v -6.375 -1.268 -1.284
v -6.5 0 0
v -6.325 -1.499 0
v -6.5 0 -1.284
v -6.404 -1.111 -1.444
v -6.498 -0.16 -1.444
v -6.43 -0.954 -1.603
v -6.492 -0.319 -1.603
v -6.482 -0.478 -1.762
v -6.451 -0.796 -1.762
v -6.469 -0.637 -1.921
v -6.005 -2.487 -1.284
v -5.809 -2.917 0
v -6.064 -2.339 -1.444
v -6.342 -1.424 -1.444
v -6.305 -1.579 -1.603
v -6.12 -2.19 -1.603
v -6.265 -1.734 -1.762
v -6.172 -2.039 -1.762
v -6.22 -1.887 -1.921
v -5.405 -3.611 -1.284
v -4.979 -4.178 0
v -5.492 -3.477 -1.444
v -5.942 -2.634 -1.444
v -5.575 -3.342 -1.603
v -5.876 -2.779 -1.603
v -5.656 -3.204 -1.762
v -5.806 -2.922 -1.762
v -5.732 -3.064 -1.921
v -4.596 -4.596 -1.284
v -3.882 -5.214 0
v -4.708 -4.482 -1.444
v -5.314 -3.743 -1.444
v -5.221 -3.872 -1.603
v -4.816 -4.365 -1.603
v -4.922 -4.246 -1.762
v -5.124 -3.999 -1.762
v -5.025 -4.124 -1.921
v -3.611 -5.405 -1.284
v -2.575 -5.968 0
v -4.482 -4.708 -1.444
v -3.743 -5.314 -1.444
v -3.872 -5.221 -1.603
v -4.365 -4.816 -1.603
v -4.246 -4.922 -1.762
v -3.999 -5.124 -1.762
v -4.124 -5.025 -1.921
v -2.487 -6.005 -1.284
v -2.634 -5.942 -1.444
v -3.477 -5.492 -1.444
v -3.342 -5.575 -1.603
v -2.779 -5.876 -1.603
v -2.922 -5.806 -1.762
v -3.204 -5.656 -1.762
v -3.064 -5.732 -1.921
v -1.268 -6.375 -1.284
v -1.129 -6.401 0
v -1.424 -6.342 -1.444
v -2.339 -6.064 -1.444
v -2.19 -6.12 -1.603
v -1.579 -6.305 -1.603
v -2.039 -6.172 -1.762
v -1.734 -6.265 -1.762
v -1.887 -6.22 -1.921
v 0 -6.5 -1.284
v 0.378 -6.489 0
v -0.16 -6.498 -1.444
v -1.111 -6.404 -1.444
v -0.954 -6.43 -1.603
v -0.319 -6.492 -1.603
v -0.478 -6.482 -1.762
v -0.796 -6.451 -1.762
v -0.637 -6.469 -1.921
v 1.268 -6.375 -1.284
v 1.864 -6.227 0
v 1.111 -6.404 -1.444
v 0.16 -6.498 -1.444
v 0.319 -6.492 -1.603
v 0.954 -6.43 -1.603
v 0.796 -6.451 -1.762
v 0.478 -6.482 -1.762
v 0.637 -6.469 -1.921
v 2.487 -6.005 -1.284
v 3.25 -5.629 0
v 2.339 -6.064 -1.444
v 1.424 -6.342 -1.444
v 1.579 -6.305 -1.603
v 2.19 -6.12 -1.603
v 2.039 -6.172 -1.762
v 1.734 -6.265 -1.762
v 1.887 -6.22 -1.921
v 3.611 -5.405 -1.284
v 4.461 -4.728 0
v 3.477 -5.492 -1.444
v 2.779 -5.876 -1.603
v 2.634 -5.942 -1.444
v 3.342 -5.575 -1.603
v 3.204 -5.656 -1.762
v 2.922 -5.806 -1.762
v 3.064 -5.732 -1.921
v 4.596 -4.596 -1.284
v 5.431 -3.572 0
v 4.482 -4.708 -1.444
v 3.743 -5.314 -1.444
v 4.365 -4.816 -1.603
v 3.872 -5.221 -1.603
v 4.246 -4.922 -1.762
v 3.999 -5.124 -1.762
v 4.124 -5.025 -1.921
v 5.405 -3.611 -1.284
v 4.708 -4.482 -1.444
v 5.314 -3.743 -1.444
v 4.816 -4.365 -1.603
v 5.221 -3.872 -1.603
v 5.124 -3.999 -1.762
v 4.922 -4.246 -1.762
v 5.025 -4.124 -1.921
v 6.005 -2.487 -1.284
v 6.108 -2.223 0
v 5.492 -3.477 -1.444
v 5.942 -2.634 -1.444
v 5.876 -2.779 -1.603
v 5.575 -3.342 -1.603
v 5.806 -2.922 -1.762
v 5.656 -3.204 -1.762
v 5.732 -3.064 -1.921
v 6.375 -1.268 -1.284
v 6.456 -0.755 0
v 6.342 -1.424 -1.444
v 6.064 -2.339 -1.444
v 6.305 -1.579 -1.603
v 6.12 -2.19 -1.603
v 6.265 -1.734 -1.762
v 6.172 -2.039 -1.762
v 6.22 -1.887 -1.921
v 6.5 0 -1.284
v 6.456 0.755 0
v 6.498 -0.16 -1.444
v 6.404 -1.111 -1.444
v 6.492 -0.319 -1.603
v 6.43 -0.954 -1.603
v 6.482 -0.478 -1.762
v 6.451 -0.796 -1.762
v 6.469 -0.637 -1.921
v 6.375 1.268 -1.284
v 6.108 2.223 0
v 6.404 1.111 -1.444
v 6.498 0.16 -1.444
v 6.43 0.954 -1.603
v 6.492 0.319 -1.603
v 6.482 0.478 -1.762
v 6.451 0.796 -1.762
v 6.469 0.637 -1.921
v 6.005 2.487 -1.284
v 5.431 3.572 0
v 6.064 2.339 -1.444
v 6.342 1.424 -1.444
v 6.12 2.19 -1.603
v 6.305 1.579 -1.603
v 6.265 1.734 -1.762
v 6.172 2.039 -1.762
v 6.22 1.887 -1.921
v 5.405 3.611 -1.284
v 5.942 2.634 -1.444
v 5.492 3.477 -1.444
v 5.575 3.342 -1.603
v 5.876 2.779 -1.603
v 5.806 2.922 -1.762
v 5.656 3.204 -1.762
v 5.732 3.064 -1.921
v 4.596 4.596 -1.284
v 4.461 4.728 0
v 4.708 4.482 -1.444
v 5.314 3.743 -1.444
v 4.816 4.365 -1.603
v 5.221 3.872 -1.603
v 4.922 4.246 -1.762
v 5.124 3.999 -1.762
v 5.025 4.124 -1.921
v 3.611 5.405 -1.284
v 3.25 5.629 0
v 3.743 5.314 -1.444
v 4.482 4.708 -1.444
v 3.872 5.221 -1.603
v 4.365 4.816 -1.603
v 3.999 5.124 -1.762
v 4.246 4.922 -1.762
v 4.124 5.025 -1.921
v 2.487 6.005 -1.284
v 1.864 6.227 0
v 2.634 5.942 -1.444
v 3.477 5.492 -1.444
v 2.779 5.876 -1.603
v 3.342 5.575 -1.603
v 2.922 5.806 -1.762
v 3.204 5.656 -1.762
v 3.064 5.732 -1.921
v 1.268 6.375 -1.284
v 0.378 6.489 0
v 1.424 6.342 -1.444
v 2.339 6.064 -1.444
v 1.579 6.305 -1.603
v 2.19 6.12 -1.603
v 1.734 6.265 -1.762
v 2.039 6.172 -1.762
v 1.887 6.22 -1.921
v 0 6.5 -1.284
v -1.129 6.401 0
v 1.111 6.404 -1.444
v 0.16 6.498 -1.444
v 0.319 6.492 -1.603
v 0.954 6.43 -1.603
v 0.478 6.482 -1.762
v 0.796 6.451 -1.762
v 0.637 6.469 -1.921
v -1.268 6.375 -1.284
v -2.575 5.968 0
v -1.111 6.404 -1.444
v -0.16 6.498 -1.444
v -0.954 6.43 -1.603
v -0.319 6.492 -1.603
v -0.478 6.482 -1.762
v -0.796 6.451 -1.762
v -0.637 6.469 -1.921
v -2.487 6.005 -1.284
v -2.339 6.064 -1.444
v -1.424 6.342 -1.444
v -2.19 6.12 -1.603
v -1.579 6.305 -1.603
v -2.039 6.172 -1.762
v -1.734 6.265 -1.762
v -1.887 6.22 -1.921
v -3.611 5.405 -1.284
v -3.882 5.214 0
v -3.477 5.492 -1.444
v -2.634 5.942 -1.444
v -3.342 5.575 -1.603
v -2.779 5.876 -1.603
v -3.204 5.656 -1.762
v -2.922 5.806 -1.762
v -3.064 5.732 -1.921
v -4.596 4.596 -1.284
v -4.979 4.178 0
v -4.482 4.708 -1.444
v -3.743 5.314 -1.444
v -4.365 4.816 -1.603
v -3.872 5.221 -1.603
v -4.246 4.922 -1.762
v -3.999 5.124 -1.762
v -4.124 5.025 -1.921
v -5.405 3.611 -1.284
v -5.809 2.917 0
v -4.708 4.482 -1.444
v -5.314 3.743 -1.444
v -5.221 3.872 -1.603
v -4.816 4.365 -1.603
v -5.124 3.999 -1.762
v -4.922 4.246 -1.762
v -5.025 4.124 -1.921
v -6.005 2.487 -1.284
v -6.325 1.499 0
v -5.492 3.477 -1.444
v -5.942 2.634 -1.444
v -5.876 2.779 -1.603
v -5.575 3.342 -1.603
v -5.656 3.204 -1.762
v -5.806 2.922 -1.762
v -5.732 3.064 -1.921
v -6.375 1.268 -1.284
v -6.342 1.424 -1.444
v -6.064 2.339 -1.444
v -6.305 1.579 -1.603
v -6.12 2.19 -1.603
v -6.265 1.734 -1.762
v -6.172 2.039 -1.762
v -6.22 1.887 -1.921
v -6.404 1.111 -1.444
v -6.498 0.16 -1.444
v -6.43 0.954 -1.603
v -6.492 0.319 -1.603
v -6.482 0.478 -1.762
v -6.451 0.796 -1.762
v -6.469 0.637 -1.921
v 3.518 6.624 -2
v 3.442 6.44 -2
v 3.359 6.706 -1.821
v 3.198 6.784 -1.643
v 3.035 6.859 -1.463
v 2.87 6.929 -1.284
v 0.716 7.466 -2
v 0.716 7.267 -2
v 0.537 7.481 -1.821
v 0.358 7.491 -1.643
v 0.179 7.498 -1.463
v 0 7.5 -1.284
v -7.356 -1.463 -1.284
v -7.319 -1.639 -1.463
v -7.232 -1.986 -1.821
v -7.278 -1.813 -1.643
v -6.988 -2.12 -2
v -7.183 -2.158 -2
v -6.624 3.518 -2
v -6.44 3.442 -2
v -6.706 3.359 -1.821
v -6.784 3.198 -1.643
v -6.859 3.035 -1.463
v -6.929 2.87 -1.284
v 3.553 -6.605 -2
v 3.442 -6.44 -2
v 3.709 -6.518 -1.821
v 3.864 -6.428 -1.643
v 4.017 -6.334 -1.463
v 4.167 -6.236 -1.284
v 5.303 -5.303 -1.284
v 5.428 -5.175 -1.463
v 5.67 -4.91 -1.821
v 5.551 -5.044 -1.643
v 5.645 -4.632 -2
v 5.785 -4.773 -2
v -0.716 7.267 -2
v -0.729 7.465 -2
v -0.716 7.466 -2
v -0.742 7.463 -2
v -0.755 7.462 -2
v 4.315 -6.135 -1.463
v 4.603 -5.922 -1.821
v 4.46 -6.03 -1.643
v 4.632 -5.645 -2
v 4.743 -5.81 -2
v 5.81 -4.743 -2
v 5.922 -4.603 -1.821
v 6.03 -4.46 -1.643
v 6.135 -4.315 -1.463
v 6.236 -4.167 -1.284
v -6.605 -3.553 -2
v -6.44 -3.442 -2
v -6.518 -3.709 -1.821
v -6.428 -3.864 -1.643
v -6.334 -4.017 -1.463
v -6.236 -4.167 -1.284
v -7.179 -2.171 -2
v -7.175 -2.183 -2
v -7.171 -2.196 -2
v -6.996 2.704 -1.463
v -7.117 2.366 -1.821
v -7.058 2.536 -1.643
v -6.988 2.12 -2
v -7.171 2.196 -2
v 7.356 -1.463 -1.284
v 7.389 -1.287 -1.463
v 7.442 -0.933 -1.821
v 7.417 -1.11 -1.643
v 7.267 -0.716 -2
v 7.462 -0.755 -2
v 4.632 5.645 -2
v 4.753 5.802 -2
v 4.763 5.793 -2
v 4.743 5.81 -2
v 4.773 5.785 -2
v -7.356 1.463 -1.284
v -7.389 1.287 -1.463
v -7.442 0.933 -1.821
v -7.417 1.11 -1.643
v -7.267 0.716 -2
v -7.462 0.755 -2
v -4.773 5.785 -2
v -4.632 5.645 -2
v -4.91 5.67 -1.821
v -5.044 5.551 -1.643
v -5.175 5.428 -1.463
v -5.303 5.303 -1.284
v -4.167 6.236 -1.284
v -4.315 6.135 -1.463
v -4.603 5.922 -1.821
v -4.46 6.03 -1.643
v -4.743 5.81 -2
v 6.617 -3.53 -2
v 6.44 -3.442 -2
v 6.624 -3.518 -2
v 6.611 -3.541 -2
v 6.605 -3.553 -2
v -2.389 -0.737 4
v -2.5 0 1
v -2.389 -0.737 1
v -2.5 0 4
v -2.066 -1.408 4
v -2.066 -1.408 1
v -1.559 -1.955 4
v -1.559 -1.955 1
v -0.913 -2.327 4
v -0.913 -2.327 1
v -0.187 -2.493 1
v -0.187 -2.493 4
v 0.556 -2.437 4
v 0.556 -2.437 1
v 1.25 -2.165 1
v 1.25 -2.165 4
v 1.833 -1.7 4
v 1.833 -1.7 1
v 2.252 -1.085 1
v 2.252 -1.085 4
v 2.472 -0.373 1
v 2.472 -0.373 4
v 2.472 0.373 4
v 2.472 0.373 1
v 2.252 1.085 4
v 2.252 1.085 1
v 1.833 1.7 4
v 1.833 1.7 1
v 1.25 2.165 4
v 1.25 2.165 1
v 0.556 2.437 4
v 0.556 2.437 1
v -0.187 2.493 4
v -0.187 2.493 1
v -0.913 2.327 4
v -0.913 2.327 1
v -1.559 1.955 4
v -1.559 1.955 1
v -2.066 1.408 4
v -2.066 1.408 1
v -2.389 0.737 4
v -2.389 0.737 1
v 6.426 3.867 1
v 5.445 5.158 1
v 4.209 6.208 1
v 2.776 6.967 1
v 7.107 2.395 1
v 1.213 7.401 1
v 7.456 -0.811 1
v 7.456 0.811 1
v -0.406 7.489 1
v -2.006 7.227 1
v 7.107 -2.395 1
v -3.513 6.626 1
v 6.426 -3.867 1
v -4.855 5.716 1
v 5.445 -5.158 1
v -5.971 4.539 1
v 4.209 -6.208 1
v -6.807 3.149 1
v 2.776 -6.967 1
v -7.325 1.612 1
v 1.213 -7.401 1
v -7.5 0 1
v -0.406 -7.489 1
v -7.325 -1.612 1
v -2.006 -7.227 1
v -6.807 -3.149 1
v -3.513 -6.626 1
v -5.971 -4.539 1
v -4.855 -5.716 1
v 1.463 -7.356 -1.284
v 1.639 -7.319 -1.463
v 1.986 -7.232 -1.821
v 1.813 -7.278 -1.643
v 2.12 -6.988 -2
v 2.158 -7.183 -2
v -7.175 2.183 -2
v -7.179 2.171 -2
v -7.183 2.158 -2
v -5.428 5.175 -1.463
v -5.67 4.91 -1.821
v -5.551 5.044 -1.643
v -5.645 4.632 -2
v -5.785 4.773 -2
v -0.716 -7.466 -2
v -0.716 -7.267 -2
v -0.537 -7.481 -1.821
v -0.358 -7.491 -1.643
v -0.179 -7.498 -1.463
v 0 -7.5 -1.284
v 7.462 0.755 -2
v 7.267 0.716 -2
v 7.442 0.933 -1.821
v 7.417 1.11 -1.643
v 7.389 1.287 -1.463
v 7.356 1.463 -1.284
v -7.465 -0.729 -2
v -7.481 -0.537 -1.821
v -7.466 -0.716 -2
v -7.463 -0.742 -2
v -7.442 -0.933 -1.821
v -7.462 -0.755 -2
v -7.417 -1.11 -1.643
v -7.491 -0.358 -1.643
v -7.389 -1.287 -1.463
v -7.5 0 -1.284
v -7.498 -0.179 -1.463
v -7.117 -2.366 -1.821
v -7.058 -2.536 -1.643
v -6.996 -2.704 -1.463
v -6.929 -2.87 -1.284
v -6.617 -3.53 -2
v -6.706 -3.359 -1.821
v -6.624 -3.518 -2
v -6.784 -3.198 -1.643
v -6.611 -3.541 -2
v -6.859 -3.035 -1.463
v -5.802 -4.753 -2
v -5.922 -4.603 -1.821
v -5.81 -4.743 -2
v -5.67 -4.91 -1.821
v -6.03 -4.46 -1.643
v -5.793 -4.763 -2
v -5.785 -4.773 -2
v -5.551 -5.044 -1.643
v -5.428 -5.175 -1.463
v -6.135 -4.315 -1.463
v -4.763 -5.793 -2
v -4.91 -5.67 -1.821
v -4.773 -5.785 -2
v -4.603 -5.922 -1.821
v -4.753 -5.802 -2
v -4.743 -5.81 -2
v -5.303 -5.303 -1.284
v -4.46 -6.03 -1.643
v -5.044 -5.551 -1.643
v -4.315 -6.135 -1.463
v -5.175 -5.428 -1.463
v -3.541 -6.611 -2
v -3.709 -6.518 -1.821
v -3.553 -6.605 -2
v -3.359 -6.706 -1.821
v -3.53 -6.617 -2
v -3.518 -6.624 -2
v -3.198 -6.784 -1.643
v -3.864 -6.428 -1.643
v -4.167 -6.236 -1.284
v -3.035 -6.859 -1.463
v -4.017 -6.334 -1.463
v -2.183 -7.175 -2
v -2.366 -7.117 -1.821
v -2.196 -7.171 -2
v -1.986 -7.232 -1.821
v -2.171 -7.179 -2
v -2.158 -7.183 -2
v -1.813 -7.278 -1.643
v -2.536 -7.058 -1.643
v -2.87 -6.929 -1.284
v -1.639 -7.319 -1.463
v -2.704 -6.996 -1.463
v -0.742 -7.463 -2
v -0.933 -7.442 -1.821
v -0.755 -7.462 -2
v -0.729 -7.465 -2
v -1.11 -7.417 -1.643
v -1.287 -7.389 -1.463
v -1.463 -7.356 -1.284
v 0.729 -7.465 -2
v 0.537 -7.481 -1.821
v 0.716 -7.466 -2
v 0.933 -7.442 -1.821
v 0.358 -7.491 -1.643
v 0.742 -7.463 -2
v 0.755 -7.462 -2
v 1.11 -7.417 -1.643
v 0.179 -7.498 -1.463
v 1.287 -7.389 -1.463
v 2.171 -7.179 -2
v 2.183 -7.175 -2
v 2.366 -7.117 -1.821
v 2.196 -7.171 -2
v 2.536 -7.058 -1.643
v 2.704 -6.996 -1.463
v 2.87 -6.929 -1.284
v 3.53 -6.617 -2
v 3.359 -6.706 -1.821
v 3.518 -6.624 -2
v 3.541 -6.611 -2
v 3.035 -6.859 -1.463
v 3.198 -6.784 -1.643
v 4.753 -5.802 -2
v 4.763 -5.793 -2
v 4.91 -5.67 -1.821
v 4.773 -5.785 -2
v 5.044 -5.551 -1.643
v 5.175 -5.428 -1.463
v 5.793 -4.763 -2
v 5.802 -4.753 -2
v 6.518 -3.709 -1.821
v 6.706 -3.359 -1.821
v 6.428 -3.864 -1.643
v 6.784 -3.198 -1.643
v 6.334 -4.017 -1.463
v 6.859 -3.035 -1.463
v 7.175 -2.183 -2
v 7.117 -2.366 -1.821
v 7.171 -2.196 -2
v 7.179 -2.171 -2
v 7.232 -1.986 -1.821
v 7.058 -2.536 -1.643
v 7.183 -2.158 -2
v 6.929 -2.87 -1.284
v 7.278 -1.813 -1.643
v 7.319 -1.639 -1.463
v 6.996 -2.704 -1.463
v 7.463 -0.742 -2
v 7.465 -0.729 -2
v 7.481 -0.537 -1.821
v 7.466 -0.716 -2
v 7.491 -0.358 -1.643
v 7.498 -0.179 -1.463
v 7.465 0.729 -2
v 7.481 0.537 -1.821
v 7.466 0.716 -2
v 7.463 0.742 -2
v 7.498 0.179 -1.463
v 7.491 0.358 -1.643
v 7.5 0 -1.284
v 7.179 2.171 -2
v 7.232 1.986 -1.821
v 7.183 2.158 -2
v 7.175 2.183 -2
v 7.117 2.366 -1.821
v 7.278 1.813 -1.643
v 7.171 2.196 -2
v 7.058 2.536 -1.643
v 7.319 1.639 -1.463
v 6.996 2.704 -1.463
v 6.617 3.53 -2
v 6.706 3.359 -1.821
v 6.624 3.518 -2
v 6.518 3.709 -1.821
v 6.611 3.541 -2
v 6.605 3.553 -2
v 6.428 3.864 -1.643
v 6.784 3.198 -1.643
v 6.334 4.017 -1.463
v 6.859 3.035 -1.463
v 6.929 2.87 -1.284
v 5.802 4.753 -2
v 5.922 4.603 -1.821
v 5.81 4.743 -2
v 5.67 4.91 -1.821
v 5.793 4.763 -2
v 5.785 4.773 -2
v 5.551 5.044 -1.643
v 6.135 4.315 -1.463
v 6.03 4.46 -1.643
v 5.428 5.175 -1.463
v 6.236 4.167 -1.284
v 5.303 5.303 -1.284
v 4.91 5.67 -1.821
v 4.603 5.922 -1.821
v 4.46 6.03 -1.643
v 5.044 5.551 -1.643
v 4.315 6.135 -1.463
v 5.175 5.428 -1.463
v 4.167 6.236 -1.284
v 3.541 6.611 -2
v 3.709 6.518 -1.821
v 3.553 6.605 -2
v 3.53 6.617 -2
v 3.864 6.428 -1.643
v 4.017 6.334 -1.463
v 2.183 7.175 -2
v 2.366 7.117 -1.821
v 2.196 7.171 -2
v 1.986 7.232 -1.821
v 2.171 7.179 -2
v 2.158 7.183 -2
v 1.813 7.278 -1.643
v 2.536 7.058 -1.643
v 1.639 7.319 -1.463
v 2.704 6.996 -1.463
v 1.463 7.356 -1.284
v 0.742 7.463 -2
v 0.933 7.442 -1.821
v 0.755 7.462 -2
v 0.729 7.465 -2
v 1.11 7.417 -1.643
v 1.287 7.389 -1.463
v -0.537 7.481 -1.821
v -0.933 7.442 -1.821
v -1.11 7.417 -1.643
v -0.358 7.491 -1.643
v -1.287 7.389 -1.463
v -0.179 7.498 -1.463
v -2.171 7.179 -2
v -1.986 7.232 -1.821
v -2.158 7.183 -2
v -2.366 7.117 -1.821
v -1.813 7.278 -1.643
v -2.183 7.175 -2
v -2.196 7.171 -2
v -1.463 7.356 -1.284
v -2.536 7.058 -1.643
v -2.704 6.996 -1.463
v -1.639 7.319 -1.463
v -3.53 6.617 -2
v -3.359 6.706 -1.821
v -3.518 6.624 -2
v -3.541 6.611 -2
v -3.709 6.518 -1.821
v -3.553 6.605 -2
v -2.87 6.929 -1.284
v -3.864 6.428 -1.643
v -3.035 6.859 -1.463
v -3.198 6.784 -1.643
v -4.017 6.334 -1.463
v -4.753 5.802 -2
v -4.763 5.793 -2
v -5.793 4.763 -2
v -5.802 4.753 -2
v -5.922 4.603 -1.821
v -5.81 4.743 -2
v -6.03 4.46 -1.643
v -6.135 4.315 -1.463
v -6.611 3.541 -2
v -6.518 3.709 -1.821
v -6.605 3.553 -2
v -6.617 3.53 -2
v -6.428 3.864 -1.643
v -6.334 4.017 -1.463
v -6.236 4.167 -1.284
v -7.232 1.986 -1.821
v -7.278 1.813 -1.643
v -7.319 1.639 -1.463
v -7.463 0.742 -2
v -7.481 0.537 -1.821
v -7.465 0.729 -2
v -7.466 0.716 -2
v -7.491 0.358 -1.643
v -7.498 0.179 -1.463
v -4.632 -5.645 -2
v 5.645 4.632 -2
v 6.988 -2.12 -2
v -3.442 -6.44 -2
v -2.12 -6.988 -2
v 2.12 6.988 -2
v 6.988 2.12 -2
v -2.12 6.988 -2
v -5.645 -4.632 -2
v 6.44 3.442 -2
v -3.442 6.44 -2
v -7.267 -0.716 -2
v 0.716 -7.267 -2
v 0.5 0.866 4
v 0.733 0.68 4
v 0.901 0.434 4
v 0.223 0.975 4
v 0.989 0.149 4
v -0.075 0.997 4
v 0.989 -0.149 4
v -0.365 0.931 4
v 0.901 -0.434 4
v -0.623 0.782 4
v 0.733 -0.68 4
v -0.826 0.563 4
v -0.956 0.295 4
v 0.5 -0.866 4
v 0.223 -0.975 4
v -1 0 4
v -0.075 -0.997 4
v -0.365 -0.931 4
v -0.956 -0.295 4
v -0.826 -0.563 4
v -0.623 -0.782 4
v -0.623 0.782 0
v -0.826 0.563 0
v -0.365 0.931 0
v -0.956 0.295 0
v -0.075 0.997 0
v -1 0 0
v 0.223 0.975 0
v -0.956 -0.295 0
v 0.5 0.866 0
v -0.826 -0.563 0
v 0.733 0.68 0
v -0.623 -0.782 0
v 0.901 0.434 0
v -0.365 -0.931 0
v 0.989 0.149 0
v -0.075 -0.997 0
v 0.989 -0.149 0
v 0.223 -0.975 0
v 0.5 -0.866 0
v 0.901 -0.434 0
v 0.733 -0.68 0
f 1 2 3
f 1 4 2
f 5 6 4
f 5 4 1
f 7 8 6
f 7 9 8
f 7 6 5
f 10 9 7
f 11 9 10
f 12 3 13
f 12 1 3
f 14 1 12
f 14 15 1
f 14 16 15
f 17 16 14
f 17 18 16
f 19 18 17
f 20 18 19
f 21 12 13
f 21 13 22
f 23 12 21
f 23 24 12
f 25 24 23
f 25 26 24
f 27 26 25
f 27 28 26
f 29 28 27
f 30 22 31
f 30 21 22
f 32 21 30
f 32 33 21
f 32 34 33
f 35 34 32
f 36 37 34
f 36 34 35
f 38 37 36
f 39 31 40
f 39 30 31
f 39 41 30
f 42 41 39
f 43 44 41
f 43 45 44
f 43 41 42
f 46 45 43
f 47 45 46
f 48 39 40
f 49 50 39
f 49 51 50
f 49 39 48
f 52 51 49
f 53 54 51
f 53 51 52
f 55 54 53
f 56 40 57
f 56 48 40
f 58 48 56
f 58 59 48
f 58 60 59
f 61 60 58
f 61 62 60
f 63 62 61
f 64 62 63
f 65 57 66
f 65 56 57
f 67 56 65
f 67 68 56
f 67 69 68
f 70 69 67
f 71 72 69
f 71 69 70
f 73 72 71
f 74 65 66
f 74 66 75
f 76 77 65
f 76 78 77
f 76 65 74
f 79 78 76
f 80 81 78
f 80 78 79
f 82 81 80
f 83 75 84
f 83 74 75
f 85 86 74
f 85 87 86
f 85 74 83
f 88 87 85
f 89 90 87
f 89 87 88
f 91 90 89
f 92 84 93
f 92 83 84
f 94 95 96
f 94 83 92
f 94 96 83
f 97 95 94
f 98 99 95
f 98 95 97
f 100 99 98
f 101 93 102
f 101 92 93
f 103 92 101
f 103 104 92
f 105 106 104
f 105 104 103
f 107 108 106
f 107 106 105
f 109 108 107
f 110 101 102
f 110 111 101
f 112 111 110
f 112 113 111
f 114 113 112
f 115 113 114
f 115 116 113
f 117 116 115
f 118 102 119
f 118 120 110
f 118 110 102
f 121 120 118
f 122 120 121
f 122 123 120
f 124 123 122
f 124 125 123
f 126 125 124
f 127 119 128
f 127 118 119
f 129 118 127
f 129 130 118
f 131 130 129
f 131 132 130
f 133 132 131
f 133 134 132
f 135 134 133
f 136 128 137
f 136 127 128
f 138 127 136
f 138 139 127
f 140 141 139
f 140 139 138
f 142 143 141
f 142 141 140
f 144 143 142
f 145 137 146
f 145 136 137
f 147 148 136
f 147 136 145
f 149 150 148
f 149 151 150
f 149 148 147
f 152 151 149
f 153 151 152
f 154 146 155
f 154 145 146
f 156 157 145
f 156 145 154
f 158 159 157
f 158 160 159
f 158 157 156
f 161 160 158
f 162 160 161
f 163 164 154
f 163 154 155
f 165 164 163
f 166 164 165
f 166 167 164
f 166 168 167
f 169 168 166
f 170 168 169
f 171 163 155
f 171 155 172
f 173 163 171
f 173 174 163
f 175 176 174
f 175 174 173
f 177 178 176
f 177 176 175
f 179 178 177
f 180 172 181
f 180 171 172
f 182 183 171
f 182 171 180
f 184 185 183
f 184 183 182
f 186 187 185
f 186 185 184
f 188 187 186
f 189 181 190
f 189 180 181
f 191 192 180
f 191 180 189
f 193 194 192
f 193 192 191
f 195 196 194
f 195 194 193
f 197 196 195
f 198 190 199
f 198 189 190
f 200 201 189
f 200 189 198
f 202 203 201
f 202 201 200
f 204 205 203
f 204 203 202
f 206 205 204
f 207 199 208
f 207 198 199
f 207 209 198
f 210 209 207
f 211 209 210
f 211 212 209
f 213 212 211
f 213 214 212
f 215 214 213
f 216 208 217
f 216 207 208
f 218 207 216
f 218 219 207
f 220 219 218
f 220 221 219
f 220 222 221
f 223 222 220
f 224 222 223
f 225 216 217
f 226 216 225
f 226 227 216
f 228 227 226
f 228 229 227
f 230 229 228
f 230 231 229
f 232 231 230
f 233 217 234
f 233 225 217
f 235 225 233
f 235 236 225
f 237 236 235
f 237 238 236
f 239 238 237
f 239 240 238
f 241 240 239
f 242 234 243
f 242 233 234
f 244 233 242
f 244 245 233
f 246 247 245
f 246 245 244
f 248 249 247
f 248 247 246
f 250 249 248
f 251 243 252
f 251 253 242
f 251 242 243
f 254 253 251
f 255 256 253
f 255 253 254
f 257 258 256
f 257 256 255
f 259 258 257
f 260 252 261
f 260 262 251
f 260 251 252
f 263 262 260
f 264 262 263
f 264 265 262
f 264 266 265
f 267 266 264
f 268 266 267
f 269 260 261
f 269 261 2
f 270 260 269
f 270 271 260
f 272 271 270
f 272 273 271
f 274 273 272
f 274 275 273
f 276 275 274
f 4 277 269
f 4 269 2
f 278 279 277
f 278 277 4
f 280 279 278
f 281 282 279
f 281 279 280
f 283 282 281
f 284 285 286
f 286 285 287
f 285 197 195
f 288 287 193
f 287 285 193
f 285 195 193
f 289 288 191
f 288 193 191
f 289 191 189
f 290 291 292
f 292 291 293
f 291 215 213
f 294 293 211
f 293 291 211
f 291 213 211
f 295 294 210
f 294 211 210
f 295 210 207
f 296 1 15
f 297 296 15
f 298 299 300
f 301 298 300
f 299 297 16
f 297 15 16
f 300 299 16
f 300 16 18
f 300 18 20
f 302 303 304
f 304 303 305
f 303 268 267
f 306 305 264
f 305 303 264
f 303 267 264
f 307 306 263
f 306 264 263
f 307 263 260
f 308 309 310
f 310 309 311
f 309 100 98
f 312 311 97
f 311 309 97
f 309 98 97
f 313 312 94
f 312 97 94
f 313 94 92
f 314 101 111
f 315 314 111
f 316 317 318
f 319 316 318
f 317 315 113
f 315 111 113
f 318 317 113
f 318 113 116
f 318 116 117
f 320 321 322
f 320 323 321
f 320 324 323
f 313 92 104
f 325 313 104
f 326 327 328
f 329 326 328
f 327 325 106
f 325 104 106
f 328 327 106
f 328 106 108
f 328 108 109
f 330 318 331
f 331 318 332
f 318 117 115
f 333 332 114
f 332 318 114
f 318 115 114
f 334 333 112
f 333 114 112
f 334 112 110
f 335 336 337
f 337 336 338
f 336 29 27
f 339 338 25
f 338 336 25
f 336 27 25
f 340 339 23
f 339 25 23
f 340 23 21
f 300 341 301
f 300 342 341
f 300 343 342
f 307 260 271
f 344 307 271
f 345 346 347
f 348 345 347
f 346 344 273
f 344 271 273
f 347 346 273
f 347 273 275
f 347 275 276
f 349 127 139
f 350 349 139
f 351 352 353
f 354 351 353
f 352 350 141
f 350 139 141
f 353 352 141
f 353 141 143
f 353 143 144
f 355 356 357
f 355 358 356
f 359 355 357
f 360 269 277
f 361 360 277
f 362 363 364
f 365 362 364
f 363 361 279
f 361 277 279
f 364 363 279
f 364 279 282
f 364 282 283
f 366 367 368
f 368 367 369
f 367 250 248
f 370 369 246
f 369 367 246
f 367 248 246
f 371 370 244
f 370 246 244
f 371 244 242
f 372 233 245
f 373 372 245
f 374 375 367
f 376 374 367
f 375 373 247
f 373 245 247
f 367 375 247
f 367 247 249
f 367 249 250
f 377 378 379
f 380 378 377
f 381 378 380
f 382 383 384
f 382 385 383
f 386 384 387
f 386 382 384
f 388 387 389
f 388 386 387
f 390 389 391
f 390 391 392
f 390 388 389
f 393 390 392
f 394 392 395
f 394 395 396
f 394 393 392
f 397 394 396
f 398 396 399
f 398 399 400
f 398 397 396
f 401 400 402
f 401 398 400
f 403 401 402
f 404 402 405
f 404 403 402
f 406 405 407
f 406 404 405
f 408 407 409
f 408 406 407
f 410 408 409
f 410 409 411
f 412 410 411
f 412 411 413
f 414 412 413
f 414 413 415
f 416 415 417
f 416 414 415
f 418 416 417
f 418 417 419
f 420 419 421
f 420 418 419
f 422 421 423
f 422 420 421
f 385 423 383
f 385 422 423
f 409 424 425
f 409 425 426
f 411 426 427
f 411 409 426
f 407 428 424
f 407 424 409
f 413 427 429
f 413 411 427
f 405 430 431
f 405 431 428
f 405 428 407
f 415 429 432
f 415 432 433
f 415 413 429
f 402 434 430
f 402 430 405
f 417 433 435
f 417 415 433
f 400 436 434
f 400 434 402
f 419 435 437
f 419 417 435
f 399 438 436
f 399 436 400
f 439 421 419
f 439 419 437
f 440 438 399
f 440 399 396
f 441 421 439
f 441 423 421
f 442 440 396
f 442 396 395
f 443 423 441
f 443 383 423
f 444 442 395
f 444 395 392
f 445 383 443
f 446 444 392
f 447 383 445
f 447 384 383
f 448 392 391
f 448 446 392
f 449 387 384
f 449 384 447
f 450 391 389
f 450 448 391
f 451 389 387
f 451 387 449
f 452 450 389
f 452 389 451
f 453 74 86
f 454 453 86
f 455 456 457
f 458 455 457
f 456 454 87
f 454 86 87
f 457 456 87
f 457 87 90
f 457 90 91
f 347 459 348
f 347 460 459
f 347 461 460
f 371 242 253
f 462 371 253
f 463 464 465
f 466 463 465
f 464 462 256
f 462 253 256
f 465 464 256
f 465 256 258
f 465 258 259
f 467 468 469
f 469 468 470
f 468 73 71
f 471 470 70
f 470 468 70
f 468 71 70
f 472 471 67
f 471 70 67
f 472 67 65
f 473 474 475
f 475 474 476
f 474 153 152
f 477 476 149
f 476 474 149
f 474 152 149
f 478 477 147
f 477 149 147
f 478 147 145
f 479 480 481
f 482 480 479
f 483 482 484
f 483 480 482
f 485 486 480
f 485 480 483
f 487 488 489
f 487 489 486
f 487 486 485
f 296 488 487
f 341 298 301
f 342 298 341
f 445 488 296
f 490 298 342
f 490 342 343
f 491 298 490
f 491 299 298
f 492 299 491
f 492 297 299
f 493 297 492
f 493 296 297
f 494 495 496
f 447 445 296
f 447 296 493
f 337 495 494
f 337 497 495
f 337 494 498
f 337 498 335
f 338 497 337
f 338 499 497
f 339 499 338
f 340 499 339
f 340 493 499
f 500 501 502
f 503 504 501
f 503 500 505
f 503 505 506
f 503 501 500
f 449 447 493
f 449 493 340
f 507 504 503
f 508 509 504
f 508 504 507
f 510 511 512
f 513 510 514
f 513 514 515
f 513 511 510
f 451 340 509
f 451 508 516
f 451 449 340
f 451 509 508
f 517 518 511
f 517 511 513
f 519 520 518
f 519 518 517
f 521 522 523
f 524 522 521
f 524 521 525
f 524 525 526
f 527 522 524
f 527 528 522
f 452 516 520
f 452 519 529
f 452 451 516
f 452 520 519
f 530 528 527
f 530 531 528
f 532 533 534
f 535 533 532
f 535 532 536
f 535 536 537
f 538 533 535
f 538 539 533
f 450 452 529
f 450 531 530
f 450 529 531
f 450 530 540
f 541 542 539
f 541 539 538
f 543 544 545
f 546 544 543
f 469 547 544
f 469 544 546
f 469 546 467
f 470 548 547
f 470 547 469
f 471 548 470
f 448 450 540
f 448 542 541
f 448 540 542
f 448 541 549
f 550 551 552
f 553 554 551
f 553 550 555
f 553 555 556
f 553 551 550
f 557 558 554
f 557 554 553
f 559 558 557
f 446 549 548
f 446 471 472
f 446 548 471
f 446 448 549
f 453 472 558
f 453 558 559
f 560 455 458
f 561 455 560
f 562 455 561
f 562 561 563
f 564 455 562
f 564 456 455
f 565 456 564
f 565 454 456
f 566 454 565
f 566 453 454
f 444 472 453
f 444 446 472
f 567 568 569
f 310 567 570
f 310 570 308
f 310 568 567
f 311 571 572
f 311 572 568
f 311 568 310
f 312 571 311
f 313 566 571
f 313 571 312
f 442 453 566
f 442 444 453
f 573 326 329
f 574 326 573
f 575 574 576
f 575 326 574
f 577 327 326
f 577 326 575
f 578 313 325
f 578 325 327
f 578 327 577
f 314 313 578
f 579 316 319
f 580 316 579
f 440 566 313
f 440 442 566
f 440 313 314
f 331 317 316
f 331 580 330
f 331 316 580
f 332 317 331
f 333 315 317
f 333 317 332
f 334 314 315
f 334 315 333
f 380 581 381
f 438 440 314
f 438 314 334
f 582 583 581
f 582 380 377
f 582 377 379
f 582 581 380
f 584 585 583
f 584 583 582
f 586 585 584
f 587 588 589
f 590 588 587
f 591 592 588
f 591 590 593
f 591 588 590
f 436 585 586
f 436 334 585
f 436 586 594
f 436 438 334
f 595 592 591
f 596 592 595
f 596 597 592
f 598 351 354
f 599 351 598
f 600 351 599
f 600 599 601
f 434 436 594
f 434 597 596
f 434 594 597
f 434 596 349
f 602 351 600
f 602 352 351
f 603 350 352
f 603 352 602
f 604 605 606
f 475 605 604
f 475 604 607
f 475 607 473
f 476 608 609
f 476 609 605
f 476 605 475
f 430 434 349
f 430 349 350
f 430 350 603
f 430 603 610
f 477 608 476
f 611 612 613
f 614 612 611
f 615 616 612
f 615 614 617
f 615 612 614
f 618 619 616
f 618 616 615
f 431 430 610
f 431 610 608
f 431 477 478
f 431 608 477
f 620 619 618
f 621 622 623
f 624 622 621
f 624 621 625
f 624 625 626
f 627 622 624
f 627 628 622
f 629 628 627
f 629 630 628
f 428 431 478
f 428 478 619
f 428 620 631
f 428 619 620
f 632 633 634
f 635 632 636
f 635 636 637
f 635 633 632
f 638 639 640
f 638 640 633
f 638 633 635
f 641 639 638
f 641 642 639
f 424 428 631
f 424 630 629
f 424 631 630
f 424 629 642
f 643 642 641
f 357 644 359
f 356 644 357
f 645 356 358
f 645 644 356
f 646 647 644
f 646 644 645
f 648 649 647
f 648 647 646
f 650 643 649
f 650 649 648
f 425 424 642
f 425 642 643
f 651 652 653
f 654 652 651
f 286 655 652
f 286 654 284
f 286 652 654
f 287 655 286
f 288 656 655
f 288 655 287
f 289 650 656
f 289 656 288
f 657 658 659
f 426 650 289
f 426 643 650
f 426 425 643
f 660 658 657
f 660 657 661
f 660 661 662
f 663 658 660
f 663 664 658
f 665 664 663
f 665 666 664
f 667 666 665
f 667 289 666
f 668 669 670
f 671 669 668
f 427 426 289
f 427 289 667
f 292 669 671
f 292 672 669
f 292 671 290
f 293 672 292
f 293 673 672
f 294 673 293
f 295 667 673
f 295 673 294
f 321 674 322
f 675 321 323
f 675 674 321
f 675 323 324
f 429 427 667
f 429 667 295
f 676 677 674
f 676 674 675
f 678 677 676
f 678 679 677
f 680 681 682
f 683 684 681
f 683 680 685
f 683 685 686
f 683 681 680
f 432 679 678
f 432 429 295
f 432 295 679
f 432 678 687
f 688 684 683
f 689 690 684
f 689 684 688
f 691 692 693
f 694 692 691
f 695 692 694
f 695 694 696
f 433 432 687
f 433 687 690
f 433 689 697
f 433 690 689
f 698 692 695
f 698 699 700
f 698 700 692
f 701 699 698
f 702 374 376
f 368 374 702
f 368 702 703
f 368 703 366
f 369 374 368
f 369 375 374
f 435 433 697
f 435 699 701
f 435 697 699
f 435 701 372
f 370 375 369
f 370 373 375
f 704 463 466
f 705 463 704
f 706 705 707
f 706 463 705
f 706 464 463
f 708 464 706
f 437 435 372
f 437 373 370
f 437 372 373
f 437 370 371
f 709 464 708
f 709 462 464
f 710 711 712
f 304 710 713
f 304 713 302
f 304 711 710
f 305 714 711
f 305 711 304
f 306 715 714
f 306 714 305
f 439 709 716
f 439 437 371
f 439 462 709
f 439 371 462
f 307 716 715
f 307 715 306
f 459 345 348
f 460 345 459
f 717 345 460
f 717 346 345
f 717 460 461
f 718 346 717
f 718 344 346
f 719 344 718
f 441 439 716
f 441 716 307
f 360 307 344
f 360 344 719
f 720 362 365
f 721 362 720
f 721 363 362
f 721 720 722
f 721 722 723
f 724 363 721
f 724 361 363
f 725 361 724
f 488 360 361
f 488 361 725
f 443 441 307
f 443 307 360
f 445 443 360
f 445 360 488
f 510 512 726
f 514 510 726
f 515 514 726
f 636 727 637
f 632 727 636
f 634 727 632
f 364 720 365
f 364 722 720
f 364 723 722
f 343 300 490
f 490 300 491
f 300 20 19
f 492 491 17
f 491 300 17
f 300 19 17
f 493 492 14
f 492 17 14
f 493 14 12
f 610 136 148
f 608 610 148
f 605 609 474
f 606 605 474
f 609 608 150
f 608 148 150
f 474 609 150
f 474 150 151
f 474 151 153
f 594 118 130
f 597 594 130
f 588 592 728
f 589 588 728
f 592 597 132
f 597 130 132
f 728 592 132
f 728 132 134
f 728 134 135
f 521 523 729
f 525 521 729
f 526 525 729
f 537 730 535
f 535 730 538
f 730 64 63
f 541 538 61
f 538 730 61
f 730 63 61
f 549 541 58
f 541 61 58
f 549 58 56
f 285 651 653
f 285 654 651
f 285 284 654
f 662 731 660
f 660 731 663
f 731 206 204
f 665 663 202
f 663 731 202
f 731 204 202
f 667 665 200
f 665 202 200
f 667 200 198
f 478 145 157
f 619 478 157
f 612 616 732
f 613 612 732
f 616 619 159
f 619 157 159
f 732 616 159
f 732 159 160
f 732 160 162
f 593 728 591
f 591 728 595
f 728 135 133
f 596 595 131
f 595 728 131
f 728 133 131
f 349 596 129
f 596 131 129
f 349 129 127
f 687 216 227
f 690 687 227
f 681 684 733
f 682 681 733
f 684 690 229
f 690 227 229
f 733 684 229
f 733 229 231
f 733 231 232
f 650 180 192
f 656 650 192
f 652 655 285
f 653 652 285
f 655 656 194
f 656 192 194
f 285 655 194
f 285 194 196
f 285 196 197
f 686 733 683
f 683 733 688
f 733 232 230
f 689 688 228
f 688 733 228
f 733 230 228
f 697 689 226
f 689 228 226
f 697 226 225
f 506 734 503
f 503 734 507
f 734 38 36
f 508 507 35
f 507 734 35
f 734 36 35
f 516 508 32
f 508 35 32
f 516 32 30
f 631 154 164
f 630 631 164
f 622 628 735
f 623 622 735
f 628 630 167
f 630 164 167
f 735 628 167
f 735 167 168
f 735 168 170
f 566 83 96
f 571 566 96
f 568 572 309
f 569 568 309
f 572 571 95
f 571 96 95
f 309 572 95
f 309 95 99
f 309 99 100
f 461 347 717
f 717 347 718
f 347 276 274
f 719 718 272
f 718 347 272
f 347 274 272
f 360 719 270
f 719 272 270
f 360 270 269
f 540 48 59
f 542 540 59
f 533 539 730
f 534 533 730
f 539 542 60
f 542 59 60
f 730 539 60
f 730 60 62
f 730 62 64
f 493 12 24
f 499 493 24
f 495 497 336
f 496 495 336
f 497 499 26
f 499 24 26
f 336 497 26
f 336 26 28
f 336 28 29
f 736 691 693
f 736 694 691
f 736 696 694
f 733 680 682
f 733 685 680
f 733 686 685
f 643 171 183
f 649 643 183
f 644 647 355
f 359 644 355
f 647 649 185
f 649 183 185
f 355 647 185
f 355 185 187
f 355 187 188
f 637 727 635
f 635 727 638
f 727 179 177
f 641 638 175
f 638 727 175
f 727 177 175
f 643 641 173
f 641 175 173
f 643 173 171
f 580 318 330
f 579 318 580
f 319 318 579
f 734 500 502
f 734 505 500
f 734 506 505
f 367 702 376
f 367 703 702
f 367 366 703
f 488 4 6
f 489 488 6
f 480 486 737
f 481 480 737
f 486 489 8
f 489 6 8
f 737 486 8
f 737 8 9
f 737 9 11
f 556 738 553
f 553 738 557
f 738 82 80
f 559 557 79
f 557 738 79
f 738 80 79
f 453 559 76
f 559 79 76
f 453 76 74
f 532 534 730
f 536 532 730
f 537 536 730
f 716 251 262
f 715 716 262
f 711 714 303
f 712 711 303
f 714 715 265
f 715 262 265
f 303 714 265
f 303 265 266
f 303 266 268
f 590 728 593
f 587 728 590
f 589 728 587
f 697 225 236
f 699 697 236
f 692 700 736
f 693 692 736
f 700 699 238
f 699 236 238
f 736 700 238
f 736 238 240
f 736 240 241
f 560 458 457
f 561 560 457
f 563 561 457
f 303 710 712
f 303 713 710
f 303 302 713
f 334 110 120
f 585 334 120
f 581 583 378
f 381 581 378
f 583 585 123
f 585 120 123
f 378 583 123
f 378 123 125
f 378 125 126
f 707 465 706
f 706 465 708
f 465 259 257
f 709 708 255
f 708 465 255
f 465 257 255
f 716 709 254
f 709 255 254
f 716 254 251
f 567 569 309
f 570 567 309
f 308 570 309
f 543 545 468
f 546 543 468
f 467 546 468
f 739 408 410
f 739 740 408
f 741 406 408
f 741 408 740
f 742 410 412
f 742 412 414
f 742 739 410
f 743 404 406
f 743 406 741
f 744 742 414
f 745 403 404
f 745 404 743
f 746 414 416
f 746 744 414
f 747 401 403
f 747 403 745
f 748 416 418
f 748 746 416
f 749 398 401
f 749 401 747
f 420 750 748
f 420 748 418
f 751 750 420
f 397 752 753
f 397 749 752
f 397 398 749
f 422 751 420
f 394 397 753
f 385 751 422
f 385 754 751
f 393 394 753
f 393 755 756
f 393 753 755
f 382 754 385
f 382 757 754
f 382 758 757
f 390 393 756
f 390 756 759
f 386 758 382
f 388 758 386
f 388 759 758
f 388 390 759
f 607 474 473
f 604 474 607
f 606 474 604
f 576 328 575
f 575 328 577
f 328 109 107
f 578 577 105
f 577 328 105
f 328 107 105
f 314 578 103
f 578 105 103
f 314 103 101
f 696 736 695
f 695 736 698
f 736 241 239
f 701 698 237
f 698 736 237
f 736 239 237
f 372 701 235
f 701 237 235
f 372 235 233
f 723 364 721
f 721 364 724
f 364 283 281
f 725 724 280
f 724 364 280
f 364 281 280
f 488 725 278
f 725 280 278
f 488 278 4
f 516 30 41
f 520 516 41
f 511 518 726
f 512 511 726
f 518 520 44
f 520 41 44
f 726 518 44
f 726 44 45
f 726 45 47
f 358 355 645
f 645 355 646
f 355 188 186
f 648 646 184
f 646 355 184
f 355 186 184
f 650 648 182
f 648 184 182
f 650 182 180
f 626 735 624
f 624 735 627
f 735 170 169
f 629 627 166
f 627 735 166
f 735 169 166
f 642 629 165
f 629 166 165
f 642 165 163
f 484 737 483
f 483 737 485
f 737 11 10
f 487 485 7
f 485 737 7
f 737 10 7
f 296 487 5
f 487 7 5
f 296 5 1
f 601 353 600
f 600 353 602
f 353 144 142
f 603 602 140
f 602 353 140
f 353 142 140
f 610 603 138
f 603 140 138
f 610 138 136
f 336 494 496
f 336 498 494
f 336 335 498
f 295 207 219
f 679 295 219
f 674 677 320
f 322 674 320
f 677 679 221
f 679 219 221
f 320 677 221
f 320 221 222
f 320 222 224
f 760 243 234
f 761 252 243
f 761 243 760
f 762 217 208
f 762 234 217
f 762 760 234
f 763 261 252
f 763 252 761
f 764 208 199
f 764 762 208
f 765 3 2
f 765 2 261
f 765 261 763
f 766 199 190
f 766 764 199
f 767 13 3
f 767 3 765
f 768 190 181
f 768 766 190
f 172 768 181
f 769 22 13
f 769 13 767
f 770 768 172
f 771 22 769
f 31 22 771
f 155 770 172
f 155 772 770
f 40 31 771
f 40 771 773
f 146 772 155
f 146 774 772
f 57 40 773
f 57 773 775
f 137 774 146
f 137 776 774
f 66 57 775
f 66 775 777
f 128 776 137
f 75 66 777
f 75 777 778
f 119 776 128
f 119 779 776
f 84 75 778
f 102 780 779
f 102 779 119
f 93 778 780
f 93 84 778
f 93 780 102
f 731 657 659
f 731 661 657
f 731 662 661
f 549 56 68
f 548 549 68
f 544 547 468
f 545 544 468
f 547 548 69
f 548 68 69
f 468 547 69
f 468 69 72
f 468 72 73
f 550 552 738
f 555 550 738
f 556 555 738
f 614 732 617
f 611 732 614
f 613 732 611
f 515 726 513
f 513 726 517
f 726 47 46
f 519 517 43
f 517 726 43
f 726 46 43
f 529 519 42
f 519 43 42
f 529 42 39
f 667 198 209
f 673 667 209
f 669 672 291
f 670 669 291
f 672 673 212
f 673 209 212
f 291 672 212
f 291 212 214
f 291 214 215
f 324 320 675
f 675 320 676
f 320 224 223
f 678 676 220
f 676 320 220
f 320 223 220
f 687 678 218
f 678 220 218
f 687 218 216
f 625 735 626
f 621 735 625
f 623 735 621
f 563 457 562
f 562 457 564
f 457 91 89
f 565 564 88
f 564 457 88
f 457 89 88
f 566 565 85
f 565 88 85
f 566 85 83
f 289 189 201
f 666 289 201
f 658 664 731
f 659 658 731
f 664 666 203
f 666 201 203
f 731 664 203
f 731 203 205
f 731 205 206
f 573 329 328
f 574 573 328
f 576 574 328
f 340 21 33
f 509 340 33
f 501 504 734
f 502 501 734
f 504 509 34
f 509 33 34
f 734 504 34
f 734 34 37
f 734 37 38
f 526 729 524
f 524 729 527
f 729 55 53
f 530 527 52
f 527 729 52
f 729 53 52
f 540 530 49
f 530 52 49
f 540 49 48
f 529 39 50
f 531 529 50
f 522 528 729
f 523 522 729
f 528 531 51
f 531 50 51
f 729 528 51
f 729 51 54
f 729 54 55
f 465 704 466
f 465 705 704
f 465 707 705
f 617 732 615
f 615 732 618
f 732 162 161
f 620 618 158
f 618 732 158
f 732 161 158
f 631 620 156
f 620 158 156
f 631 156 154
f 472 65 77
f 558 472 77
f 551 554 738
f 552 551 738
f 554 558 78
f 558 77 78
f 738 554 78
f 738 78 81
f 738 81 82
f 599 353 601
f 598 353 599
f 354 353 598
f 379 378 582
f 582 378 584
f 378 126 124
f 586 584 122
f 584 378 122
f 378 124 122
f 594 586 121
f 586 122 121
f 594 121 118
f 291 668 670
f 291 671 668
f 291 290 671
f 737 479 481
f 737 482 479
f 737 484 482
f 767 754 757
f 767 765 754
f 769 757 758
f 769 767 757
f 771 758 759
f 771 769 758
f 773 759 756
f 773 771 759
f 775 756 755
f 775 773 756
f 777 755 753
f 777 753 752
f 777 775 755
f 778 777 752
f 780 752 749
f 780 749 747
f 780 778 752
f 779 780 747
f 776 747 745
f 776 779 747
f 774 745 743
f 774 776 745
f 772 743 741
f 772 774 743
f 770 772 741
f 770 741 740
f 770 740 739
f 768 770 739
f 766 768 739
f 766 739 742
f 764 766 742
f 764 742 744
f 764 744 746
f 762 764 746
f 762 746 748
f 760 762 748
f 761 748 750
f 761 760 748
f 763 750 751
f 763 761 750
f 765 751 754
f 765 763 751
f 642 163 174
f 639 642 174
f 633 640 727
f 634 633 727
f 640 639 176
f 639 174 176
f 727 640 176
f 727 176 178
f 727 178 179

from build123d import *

# Parameters (mm, degrees)
CUT_EXTRUDE1_DEPTH = 10
CIRPATTERN1_COUNT  = 32


with BuildPart() as part:
    # Sketch1 → Revolve1 (revolve)
    with BuildSketch(Plane(origin=(0, 0, 0), x_dir=(1, 0, 0), z_dir=(0, 1, 0)), mode=Mode.PRIVATE) as revolve1_sk:
        Polygon((1, 0), (6.5, 0), (6.5, 2), (7.5, 2), (7.5, -1), (2.5, -1), (2.5, -4), (1, -4), align=None)
    revolve(revolve1_sk.sketch.rotate(Axis((0, 0, -10.710116732), (0, 0, 1)), 180), axis=Axis((0, 0, -10.710116732), (0, 0, 1)))

    # Sketch2 → Cut-Extrude1 (cut)
    with BuildSketch(Plane(origin=(0, 0, 0), x_dir=(1, 0, 0), z_dir=(0, 1, 0))):
        Polygon((0, 1.284275778), (2.060090555, 3.344366332), (-2.060090555, 3.344366332), align=None)
    cut_extrude1 = extrude(amount=-CUT_EXTRUDE1_DEPTH, mode=Mode.SUBTRACT)

    # CirPattern1: Cut-Extrude1 ×32 about axis
    cirpattern1_axis = Axis((0, 0, 0), (0, 0, 1))
    for i in range(1, CIRPATTERN1_COUNT):
        add(cut_extrude1.rotate(cirpattern1_axis, i * 360 / CIRPATTERN1_COUNT), mode=Mode.SUBTRACT)


solid = part.part
